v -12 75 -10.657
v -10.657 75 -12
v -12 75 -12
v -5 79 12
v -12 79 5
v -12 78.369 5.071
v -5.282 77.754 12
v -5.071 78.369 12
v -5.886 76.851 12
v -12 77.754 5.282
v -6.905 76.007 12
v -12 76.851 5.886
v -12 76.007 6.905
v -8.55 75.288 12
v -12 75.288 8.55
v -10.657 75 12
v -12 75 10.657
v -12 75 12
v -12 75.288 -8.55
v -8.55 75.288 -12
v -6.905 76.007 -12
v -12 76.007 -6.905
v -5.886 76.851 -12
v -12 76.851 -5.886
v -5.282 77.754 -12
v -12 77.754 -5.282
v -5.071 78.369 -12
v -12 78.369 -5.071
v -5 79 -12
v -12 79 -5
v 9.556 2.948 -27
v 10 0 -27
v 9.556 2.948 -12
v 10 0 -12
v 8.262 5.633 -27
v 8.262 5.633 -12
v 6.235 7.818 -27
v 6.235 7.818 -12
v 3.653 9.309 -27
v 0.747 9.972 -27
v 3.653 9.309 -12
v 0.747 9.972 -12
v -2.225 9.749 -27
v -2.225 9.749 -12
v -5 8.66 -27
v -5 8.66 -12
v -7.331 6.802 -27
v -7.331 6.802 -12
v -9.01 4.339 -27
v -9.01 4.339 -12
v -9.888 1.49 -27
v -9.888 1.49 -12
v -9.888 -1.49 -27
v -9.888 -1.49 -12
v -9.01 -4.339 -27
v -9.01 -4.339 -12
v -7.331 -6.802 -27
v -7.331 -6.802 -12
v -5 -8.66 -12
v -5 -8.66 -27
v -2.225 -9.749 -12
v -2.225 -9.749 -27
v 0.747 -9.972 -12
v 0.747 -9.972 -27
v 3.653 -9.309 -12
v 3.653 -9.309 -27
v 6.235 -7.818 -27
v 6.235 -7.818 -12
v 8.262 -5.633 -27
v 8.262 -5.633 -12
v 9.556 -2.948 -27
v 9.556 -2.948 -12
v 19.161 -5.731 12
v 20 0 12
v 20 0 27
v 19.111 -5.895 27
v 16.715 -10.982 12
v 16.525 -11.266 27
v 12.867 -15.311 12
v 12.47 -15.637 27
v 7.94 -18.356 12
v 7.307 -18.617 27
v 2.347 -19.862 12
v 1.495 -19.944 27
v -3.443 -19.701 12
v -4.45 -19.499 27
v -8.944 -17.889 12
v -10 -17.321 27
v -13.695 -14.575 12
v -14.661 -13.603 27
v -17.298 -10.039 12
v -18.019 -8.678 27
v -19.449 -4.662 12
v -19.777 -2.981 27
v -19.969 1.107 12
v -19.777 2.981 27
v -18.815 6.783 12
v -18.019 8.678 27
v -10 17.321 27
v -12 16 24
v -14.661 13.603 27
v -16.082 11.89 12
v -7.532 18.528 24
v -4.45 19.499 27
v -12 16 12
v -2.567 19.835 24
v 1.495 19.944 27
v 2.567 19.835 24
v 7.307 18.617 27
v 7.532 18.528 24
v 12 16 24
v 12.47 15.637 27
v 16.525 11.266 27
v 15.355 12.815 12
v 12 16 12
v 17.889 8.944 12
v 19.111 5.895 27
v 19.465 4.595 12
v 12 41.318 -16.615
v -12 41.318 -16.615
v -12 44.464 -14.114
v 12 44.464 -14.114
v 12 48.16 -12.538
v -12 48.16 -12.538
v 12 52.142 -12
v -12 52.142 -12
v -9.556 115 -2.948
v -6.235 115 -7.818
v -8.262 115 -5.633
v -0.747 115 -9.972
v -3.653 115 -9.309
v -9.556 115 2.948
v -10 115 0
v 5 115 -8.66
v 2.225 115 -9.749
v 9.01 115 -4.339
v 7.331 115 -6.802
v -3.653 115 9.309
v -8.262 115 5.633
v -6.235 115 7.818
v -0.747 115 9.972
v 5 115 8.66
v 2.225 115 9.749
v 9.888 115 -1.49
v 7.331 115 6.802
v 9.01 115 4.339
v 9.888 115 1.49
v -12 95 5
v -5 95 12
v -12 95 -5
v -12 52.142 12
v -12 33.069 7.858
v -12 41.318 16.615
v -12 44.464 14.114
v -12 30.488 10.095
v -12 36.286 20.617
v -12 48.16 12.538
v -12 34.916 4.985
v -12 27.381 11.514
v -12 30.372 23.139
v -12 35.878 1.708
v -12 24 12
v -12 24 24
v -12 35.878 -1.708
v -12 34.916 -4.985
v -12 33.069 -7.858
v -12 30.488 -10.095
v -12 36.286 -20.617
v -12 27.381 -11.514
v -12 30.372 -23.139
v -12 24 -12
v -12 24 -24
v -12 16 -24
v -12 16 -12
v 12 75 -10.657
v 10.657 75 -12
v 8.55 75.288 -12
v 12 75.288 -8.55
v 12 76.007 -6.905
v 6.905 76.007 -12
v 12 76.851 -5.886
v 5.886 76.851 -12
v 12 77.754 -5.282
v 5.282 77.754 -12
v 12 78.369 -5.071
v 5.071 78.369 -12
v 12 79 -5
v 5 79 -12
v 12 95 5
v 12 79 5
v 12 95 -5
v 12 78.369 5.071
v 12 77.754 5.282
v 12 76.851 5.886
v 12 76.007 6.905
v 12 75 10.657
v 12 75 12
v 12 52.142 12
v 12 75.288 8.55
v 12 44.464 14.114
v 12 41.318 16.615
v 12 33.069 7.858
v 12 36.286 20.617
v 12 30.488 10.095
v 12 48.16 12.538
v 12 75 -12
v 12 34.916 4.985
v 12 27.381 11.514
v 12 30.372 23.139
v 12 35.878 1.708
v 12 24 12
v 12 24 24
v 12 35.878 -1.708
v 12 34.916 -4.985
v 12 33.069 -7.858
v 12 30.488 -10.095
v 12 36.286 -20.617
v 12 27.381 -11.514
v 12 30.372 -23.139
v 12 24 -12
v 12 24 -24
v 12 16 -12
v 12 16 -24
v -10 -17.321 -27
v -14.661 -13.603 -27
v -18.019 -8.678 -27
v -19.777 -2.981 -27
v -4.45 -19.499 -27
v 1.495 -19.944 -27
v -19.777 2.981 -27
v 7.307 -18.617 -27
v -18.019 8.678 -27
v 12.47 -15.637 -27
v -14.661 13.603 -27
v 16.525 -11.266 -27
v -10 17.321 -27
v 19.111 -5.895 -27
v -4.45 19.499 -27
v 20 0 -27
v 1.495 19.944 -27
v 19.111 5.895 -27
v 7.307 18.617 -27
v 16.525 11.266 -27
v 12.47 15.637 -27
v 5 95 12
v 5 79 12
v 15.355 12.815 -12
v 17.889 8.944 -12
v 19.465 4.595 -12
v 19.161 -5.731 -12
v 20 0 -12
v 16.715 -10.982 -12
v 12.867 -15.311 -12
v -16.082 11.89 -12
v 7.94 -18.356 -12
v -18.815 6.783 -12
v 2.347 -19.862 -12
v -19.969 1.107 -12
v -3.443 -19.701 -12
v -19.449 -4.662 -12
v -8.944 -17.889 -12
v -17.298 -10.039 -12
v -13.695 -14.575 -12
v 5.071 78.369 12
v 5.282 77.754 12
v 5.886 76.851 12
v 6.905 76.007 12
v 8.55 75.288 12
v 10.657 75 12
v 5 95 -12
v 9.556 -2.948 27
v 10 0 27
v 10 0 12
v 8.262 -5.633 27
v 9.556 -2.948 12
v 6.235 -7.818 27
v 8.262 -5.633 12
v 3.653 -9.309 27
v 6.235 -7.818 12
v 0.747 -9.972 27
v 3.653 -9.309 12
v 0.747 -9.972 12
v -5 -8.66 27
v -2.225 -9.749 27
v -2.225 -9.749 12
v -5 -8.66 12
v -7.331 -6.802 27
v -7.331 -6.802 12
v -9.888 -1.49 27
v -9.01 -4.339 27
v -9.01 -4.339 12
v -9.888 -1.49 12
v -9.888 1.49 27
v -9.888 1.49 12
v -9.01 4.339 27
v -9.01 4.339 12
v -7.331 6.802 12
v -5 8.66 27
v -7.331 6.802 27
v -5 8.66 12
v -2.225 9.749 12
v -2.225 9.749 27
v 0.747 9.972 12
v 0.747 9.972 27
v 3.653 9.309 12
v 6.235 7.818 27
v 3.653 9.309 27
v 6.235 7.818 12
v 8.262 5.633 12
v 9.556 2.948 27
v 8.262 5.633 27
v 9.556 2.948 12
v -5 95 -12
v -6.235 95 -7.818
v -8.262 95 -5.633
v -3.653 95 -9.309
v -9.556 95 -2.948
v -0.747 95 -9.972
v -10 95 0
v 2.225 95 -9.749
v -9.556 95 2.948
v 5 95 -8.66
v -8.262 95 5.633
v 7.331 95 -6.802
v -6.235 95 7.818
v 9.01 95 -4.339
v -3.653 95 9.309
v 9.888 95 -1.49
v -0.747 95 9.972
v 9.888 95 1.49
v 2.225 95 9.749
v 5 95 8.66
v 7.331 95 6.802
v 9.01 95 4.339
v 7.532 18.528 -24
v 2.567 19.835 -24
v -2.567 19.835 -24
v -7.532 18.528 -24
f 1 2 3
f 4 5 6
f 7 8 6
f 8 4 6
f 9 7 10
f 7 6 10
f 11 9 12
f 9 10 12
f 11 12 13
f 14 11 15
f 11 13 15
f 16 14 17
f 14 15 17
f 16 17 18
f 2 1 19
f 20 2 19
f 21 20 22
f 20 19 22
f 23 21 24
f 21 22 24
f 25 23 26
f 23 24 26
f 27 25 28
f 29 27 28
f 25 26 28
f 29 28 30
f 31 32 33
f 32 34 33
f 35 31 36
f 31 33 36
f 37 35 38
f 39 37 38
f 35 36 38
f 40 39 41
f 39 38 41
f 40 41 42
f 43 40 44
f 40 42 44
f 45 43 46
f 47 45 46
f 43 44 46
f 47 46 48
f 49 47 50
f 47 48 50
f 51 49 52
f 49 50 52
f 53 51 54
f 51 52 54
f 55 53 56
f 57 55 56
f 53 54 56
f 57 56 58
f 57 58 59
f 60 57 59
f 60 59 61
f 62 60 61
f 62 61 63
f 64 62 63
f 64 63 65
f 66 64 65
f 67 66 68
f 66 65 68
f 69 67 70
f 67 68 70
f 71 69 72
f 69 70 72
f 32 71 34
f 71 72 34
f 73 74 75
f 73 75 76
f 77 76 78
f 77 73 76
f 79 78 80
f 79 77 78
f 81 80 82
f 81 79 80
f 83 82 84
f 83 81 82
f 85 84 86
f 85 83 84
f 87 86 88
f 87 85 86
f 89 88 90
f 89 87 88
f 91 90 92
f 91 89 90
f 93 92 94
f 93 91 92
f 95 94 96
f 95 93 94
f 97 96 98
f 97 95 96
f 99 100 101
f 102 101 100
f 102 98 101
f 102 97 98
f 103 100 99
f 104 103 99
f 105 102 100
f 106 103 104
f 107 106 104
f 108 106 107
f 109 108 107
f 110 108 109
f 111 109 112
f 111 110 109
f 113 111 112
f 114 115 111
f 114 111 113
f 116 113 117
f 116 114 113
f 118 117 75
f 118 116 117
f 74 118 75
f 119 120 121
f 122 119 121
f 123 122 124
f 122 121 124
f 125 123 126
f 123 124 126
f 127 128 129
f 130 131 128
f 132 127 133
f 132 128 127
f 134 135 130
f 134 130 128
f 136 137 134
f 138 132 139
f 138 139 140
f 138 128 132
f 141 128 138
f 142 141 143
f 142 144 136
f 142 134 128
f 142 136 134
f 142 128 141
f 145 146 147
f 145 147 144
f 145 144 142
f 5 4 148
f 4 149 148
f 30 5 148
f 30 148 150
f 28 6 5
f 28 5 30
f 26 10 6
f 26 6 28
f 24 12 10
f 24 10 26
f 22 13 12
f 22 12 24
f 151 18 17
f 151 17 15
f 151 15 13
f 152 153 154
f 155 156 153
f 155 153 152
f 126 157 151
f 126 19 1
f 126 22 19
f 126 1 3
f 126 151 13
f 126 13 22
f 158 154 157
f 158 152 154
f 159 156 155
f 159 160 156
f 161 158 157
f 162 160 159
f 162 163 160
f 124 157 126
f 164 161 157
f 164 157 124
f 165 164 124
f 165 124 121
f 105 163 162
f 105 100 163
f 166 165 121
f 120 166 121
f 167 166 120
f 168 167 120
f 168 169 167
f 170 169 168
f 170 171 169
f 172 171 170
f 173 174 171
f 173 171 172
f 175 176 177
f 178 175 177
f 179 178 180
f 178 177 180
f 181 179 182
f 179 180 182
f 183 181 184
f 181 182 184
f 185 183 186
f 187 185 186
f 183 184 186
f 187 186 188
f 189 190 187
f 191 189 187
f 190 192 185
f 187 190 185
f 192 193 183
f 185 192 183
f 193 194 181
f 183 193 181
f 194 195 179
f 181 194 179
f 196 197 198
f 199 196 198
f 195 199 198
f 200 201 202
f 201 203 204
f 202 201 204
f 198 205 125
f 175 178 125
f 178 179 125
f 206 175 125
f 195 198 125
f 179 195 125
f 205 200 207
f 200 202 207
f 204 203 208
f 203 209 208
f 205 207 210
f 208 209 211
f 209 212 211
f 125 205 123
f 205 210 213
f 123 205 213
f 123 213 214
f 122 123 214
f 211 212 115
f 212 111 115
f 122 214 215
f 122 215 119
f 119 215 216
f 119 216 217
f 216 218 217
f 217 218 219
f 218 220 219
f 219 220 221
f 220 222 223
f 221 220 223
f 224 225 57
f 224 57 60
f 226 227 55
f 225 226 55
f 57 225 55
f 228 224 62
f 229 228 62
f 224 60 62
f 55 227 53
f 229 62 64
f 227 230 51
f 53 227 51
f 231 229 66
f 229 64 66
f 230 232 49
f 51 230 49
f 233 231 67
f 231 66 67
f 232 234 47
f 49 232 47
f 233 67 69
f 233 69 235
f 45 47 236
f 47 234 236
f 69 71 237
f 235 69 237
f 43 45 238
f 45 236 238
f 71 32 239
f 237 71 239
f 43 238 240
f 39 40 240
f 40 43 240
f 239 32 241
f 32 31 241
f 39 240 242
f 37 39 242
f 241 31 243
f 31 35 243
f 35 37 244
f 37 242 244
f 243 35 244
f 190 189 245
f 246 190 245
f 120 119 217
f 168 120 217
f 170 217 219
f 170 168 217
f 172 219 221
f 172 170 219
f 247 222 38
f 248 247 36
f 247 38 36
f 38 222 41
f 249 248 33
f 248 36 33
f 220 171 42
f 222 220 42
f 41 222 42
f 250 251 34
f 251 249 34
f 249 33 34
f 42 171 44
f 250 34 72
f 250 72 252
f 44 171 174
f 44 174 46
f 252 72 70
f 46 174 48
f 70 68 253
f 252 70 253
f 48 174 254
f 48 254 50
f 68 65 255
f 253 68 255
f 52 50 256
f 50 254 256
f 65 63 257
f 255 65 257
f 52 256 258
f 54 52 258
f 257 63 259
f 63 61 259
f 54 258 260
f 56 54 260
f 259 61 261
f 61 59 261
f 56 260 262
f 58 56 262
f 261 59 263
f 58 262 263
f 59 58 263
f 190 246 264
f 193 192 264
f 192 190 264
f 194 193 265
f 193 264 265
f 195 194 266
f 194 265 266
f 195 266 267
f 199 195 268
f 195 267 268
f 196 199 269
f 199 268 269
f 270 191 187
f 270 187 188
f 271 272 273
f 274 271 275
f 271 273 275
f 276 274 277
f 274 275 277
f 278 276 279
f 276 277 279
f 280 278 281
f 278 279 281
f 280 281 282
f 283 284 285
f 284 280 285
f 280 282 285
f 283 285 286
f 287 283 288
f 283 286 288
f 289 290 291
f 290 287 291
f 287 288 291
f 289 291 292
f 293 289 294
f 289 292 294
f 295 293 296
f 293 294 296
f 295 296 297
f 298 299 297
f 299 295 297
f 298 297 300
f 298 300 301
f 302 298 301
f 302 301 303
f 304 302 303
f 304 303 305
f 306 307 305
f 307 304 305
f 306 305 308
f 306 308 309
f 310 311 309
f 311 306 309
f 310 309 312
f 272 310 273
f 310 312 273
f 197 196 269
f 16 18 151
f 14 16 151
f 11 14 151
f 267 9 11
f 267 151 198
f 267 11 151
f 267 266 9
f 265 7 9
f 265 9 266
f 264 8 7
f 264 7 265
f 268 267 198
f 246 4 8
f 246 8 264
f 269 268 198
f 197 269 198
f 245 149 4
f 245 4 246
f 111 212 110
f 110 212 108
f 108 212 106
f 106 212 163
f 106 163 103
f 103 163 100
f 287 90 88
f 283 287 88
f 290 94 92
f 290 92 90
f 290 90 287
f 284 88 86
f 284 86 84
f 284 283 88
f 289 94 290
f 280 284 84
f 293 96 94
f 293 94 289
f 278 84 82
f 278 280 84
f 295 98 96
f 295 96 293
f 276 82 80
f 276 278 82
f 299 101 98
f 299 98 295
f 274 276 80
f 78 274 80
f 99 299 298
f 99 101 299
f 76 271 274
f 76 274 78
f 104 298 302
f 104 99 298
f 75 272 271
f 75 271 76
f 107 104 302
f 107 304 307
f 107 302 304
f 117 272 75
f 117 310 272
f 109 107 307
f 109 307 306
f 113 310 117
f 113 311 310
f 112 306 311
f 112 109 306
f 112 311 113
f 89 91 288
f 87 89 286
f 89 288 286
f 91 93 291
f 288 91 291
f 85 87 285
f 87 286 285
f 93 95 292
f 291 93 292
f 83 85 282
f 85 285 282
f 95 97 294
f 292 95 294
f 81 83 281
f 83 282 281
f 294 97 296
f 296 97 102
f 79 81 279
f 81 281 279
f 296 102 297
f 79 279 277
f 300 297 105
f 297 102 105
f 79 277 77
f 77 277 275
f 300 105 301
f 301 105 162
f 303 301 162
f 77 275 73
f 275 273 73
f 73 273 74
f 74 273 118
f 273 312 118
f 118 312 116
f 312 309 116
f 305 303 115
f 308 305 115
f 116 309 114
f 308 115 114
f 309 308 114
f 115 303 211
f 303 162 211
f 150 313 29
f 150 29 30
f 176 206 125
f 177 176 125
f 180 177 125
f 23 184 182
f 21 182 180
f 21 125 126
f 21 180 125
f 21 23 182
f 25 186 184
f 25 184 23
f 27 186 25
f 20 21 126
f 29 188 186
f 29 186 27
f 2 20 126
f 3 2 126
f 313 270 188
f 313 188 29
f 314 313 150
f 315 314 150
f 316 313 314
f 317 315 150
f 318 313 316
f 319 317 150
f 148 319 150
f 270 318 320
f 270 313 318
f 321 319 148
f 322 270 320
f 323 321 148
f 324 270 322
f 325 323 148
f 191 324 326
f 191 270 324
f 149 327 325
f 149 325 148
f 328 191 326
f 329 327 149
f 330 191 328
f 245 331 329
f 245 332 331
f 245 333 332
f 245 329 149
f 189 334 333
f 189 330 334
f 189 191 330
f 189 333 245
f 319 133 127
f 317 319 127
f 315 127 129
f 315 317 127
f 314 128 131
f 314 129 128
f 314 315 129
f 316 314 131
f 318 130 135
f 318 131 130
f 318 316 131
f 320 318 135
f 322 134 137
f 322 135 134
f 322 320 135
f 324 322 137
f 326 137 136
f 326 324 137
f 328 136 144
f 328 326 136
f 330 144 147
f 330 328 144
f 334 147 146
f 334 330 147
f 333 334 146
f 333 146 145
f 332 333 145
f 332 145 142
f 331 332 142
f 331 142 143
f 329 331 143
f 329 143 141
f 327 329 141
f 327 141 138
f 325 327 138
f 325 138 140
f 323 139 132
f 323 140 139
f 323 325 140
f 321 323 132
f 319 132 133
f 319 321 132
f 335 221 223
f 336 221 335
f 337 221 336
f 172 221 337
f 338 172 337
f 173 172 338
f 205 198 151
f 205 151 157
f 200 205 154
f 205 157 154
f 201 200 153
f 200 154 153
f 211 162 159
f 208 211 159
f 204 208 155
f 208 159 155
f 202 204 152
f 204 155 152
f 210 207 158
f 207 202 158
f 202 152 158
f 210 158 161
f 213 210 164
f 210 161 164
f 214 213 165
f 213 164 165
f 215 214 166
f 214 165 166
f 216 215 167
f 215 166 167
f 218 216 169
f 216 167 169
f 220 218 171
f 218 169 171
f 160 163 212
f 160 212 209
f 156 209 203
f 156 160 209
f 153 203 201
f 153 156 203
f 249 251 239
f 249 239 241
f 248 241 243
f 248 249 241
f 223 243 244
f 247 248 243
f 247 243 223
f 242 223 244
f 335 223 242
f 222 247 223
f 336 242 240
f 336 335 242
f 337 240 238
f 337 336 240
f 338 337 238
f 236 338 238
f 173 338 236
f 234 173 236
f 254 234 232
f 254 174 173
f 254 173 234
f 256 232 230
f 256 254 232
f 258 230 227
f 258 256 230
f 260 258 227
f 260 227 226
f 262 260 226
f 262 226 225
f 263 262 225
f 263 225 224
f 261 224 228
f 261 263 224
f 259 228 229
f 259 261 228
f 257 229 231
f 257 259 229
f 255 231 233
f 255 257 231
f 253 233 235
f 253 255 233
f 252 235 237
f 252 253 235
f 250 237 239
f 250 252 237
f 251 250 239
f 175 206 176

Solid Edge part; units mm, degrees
sketch "Sketch1" plane through (0, 0, 0) normal (0, 0, 1) x (1, 0, 0)
  circle A0 centre (0, 0) radius 20
  circle A1 centre (0, 0) radius 10
extrude "Protrusion1" add sketch "Sketch1" along normal mid plane 54
sketch "Sketch2" plane through (0, 0, 0) normal (0, -1, 0) x (1, 0, 0)
  line L0 (-20, 12) -> (20, 12)
  line L1 (20, 12) -> (20, -12)
  line L2 (20, -12) -> (-20, -12)
  line L3 (-20, -12) -> (-20, 12)
  dimension "D1" = 24
  dimension "D2" = 40
extrude "ExtrudedCutout_1" cut sketch "Sketch2" along normal mid plane 239.353
sketch "Sketch3" plane through (0, 0, 0) normal (1, 0, 0) x (0, 1, 0)
  line L0 (24, 12) -> (20, 12)
  line L1 (12, 12) -> (20, 12)
  line L2 (12, 24) -> (12, 12)
  line L3 (24, 24) -> (12, 24)
  line L4 (24, -24) -> (12, -24)
  line L5 (12, -24) -> (12, -12)
  line L6 (12, -12) -> (20, -12)
  line L7 (24, -12) -> (20, -12)
  arc A0 (24, 24) -> (24, -24) centre (24, 0) cw
  arc A1 (24, -12) -> (24, 12) centre (24, 0) ccw
extrude "ExtrudedProtrusion_2" add sketch "Sketch3" along normal mid plane 24
sketch "Sketch4" plane through (0, 95, 0) normal (0, -1, 0) x (1, 0, 0)
  line L0 (-12, 12) -> (12, 12)
  line L1 (12, 12) -> (12, -12)
  line L2 (12, -12) -> (-12, -12)
  line L3 (-12, -12) -> (-12, 12)
  dimension "D1" = 24
  dimension "D2" = 24
extrude "Protrusion2" add sketch "Sketch4" along normal up to next
sketch "Sketch5" plane through (0, 95, 0) normal (0, 1, 0) x (-1, 0, 0)
  circle A0 centre (0, 0) radius 10
extrude "ExtrudedProtrusion_4" add sketch "Sketch5" along normal blind 20
fillet "Round_1" radius 15 2 edges at (0, 44.7846, 12) (0, 44.7846, -12)
sketch "Sketch6" plane through (0, 95, 0) normal (0, 1, 0) x (-1, 0, 0)
  line L0 (12, 5) -> (12, -5)
  line L1 (5, 12) -> (12, 5)
  line L2 (-5, 12) -> (5, 12)
  line L3 (-12, 5) -> (-5, 12)
  line L4 (-12, -5) -> (-12, 5)
  line L5 (-12, -5) -> (-5, -12)
  line L6 (-5, -12) -> (5, -12)
  line L7 (5, -12) -> (12, -5)
extrude "ExtrudedCutout_3" cut sketch "Sketch6" against normal blind 20 flip side to cut
fillet "Round_2" radius 4 4 edges at (8.5, 75, 8.5) (-8.5, 75, 8.5) (-8.5, 75, -8.5) (8.5, 75, -8.5)
properties part number "1"
